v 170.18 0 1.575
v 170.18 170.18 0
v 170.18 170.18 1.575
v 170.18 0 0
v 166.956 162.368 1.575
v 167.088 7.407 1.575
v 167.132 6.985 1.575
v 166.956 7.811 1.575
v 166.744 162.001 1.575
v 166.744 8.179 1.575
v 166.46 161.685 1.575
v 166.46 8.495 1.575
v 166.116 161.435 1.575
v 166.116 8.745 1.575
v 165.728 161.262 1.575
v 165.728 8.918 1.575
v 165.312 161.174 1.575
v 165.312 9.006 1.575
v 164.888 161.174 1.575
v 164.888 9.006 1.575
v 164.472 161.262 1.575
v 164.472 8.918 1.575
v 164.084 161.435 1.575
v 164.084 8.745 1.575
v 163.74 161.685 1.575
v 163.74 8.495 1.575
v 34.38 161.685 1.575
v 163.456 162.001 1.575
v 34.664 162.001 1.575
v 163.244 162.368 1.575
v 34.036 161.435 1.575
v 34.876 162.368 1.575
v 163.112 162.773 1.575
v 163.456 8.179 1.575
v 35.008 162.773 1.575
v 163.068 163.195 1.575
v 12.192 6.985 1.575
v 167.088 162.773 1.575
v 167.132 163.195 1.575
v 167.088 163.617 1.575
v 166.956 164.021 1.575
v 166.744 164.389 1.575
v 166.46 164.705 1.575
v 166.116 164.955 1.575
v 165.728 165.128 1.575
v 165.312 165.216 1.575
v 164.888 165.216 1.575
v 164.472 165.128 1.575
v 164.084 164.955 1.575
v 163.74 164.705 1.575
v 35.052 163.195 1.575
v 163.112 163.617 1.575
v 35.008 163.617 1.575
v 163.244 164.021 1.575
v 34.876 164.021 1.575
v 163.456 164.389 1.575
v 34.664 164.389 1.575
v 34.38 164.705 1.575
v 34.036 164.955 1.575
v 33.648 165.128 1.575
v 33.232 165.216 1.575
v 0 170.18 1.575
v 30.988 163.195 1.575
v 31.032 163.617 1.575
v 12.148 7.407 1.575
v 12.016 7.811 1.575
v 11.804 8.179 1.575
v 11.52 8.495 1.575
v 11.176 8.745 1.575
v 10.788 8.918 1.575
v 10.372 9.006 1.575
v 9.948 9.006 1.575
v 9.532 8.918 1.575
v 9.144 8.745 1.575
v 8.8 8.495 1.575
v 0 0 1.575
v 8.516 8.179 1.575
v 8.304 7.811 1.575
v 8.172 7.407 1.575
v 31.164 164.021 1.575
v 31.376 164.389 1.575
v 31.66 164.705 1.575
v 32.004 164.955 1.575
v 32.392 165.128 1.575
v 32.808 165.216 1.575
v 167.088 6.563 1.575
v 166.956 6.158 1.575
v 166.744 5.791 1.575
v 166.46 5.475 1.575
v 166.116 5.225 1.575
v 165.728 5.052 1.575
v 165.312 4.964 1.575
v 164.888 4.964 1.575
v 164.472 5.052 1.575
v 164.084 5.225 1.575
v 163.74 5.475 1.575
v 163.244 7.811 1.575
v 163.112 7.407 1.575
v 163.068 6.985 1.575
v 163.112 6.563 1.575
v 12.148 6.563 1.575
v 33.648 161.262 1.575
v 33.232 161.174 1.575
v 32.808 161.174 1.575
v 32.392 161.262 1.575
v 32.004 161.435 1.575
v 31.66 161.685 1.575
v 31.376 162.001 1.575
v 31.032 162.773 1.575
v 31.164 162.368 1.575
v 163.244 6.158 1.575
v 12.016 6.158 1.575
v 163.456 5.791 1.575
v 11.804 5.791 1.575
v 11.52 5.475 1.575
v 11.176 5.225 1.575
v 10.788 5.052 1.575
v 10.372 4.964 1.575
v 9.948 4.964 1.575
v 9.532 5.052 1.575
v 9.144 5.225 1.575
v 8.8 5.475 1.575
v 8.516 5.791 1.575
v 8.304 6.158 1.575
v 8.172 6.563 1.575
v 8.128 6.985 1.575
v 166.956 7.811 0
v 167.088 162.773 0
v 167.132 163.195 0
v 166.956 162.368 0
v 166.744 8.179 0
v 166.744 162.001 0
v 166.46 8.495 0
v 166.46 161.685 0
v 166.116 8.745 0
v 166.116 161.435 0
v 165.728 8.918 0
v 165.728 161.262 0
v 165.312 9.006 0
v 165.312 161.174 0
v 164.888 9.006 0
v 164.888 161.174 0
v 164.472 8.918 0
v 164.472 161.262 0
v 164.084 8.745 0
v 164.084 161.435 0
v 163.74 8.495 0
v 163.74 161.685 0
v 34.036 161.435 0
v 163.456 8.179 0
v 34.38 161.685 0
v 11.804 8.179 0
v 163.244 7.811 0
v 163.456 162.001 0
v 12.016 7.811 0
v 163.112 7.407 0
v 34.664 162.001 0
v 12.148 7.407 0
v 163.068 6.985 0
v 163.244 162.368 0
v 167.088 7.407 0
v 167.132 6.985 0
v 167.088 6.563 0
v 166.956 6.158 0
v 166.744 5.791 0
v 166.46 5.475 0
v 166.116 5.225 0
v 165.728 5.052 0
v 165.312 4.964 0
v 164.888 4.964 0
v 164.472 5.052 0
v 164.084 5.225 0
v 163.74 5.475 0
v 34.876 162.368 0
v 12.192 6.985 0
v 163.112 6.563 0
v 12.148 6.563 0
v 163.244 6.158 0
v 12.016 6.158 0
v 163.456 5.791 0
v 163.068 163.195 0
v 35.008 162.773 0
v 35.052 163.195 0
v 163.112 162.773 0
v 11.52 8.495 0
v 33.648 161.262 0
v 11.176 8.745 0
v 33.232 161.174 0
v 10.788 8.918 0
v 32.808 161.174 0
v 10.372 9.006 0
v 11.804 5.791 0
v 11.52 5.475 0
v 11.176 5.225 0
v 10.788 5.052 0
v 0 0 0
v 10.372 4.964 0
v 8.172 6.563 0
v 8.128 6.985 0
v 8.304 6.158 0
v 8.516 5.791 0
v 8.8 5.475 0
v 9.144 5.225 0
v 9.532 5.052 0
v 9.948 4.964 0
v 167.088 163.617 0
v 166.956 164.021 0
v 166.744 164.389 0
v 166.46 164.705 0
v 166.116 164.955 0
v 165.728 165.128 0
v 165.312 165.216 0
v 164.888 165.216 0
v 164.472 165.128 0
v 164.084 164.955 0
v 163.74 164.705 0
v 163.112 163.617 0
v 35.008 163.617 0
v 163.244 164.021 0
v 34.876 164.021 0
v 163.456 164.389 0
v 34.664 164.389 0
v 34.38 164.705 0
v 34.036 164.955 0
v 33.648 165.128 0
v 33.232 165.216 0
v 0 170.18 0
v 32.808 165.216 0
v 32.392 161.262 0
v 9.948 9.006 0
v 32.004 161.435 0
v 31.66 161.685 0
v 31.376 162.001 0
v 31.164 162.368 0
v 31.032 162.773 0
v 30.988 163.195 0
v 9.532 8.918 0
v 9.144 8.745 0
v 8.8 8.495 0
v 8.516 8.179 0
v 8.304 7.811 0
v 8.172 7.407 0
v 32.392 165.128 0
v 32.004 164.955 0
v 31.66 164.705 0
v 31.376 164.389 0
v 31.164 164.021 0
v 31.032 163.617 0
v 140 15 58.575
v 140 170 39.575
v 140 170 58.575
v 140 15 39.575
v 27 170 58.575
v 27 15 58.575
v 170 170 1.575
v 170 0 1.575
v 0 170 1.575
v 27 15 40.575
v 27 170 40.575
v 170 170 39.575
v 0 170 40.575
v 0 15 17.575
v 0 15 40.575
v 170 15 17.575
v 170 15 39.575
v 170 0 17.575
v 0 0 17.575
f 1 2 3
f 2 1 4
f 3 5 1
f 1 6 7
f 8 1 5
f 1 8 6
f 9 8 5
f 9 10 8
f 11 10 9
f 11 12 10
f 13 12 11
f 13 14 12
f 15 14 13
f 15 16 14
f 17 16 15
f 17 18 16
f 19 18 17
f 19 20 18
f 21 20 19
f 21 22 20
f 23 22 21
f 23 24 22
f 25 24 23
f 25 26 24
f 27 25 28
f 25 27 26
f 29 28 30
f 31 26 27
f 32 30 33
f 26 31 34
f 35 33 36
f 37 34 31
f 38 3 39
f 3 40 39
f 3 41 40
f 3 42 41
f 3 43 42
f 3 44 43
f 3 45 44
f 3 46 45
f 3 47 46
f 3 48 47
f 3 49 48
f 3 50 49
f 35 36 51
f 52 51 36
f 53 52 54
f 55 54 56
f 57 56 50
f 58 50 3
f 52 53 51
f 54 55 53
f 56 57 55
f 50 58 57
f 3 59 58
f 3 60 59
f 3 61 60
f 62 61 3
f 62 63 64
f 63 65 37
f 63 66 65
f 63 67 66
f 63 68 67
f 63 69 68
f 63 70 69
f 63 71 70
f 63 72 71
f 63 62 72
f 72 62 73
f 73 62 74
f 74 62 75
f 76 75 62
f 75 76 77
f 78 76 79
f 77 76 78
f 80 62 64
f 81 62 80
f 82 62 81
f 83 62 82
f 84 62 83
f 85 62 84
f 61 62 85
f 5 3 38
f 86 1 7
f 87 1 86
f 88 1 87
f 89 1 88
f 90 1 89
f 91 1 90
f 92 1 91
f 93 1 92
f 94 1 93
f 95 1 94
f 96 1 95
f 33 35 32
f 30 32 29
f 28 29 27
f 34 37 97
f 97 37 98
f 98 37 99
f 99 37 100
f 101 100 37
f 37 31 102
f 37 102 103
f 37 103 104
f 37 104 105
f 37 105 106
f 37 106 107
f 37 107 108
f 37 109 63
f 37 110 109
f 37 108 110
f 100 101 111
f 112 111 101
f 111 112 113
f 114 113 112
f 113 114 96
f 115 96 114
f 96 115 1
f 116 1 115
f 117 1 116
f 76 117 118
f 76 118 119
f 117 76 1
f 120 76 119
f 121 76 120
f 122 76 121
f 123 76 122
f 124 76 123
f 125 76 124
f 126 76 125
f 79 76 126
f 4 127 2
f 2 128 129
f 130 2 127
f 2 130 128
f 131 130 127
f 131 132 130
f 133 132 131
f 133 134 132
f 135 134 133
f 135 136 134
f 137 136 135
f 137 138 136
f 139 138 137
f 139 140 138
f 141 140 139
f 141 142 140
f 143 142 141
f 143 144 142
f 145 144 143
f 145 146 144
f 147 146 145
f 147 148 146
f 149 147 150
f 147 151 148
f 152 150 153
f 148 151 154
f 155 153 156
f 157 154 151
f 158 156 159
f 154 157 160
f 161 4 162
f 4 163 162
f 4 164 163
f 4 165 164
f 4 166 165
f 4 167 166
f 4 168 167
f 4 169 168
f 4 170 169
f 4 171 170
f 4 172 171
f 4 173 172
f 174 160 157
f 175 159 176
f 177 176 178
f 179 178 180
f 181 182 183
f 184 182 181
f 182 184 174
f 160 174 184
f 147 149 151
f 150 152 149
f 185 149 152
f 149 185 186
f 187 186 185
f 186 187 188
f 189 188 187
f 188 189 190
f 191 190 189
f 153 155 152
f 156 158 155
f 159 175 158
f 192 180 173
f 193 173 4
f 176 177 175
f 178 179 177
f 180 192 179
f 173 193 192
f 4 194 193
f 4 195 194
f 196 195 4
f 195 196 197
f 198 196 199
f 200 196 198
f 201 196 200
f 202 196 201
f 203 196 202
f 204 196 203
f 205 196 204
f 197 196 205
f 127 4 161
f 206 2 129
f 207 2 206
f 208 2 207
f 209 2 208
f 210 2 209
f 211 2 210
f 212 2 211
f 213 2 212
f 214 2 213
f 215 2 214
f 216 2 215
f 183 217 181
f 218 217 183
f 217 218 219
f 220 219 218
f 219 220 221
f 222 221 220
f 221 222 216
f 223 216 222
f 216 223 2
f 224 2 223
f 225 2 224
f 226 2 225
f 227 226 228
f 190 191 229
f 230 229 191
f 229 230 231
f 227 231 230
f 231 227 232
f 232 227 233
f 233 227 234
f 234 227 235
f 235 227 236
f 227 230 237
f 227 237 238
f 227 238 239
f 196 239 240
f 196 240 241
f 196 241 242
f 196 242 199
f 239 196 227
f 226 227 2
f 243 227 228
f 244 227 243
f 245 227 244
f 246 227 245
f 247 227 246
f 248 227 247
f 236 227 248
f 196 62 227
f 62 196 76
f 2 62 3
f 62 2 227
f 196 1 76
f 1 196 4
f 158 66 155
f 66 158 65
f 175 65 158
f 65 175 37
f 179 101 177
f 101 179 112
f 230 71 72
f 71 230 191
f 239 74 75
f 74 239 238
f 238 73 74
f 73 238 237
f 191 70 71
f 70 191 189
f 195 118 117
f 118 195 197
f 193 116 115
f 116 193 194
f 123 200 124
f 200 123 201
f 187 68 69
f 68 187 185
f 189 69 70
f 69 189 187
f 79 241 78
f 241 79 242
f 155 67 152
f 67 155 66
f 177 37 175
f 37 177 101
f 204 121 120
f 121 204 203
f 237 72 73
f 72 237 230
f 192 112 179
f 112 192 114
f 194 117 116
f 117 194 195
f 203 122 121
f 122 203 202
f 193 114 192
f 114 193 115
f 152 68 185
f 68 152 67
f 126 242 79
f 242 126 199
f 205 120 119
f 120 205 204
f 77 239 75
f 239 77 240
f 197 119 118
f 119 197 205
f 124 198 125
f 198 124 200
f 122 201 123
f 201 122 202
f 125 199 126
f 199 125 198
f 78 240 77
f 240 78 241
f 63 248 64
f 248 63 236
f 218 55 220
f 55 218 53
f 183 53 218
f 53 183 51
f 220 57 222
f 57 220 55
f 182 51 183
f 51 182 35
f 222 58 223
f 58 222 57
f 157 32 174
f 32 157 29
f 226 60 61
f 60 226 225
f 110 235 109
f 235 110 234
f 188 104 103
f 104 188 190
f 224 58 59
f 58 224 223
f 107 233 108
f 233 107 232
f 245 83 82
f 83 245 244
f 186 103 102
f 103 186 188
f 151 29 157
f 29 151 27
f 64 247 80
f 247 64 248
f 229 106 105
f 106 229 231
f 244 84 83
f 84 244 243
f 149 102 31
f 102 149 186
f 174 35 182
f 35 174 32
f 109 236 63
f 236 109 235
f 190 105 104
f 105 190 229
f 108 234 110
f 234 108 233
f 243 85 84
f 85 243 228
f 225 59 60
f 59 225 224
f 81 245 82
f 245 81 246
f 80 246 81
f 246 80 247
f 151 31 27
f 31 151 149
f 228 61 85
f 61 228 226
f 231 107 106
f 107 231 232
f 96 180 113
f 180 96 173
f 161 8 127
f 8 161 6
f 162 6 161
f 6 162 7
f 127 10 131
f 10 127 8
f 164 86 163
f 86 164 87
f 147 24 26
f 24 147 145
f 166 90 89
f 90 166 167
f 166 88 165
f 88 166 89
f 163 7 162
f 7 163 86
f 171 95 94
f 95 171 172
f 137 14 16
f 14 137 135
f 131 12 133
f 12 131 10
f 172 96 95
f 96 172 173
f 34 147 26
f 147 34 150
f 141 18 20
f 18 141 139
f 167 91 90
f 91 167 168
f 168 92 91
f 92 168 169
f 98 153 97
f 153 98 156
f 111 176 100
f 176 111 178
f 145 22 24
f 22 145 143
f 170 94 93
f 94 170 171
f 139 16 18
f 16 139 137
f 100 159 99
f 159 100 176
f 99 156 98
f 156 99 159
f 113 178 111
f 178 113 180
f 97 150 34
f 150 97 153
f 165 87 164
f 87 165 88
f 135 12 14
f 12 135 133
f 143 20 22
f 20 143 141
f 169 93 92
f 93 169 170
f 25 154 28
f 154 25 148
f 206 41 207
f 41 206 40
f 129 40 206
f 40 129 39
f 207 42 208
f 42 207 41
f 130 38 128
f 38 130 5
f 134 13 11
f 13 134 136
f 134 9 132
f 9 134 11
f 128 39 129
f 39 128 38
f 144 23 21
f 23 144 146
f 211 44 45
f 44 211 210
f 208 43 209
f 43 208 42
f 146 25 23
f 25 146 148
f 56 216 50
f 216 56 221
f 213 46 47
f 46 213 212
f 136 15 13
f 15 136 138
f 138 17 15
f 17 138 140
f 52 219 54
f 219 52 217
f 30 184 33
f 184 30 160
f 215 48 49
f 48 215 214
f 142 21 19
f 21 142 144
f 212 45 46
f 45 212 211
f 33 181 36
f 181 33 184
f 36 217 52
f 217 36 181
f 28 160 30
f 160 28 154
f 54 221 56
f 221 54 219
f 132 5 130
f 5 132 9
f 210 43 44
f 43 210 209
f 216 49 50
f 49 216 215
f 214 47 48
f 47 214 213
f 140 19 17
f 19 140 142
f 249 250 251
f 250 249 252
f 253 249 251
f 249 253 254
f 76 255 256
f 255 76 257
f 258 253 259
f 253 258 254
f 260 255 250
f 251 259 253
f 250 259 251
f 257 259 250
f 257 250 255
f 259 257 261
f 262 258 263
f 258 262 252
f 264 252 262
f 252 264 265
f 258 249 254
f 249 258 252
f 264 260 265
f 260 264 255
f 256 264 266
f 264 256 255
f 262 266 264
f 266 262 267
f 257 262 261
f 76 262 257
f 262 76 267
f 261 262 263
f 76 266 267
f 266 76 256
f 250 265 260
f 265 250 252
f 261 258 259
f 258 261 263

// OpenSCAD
// file: util.scad
module rounded_cube(size, radius, center=false) {
	minkowski() {
		cylinder(r=radius, center=center);
		cube(size, center=center);
	}
}

function in2mm(v) = v * 25.4;

module scale_in2mm() {
	scale([25.4, 25.4, 25.4])
		child(0);
}


$fn=20;
scale_in2mm() {
	rounded_cube([7, 7, 2], 1);
}
// main file
use <util.scad>

thickness = 0.062; // pcb thickness in inches. ref: DH77DF_TechProdSpec02.pdf

module heightConstraints() {
	// ref: mini ITX spec V1.1
	// units in mm
	areaA = [113, 155, 57];
	areaB = [170, 15, 16];
	areaC = [30, 155, 38];
	areaD = [27, 155, 39];
	alpha = 0.75;

	union() {
		color("Green", alpha) translate([27, 15, 0]) cube(areaA);
		color("Blue", alpha) cube(areaB);
		color("Red", alpha) translate([140, 15, 0]) cube(areaC);
		color("Magenta", alpha) translate([0, 15, 0]) cube(areaD);
	}
}

module mountingDiagram() {
	// ref: DH77DF_TechProdSpec02.pdf
	// units in inches
	mhole_r = 0.08; // radius, ref says 0.16 diameter

	module mhole(x, y) {
		translate([x, y, -thickness / 2]) cylinder(h=2 * thickness, r=mhole_r);
	}

	scale_in2mm() {
		difference() {
			color("Gold") cube([6.7, 6.7, thickness]);
			mhole(0.4, 0.275);
			mhole(1.3, 6.425);
			mhole(6.5, 0.275);
			mhole(6.5, 6.425);
		}
	}
}

module miniITX(withHeights=true) {
	mountingDiagram();
	if (withHeights) {
		translate([0, 0, in2mm(thickness)]) heightConstraints();
	}
}

miniITX();
